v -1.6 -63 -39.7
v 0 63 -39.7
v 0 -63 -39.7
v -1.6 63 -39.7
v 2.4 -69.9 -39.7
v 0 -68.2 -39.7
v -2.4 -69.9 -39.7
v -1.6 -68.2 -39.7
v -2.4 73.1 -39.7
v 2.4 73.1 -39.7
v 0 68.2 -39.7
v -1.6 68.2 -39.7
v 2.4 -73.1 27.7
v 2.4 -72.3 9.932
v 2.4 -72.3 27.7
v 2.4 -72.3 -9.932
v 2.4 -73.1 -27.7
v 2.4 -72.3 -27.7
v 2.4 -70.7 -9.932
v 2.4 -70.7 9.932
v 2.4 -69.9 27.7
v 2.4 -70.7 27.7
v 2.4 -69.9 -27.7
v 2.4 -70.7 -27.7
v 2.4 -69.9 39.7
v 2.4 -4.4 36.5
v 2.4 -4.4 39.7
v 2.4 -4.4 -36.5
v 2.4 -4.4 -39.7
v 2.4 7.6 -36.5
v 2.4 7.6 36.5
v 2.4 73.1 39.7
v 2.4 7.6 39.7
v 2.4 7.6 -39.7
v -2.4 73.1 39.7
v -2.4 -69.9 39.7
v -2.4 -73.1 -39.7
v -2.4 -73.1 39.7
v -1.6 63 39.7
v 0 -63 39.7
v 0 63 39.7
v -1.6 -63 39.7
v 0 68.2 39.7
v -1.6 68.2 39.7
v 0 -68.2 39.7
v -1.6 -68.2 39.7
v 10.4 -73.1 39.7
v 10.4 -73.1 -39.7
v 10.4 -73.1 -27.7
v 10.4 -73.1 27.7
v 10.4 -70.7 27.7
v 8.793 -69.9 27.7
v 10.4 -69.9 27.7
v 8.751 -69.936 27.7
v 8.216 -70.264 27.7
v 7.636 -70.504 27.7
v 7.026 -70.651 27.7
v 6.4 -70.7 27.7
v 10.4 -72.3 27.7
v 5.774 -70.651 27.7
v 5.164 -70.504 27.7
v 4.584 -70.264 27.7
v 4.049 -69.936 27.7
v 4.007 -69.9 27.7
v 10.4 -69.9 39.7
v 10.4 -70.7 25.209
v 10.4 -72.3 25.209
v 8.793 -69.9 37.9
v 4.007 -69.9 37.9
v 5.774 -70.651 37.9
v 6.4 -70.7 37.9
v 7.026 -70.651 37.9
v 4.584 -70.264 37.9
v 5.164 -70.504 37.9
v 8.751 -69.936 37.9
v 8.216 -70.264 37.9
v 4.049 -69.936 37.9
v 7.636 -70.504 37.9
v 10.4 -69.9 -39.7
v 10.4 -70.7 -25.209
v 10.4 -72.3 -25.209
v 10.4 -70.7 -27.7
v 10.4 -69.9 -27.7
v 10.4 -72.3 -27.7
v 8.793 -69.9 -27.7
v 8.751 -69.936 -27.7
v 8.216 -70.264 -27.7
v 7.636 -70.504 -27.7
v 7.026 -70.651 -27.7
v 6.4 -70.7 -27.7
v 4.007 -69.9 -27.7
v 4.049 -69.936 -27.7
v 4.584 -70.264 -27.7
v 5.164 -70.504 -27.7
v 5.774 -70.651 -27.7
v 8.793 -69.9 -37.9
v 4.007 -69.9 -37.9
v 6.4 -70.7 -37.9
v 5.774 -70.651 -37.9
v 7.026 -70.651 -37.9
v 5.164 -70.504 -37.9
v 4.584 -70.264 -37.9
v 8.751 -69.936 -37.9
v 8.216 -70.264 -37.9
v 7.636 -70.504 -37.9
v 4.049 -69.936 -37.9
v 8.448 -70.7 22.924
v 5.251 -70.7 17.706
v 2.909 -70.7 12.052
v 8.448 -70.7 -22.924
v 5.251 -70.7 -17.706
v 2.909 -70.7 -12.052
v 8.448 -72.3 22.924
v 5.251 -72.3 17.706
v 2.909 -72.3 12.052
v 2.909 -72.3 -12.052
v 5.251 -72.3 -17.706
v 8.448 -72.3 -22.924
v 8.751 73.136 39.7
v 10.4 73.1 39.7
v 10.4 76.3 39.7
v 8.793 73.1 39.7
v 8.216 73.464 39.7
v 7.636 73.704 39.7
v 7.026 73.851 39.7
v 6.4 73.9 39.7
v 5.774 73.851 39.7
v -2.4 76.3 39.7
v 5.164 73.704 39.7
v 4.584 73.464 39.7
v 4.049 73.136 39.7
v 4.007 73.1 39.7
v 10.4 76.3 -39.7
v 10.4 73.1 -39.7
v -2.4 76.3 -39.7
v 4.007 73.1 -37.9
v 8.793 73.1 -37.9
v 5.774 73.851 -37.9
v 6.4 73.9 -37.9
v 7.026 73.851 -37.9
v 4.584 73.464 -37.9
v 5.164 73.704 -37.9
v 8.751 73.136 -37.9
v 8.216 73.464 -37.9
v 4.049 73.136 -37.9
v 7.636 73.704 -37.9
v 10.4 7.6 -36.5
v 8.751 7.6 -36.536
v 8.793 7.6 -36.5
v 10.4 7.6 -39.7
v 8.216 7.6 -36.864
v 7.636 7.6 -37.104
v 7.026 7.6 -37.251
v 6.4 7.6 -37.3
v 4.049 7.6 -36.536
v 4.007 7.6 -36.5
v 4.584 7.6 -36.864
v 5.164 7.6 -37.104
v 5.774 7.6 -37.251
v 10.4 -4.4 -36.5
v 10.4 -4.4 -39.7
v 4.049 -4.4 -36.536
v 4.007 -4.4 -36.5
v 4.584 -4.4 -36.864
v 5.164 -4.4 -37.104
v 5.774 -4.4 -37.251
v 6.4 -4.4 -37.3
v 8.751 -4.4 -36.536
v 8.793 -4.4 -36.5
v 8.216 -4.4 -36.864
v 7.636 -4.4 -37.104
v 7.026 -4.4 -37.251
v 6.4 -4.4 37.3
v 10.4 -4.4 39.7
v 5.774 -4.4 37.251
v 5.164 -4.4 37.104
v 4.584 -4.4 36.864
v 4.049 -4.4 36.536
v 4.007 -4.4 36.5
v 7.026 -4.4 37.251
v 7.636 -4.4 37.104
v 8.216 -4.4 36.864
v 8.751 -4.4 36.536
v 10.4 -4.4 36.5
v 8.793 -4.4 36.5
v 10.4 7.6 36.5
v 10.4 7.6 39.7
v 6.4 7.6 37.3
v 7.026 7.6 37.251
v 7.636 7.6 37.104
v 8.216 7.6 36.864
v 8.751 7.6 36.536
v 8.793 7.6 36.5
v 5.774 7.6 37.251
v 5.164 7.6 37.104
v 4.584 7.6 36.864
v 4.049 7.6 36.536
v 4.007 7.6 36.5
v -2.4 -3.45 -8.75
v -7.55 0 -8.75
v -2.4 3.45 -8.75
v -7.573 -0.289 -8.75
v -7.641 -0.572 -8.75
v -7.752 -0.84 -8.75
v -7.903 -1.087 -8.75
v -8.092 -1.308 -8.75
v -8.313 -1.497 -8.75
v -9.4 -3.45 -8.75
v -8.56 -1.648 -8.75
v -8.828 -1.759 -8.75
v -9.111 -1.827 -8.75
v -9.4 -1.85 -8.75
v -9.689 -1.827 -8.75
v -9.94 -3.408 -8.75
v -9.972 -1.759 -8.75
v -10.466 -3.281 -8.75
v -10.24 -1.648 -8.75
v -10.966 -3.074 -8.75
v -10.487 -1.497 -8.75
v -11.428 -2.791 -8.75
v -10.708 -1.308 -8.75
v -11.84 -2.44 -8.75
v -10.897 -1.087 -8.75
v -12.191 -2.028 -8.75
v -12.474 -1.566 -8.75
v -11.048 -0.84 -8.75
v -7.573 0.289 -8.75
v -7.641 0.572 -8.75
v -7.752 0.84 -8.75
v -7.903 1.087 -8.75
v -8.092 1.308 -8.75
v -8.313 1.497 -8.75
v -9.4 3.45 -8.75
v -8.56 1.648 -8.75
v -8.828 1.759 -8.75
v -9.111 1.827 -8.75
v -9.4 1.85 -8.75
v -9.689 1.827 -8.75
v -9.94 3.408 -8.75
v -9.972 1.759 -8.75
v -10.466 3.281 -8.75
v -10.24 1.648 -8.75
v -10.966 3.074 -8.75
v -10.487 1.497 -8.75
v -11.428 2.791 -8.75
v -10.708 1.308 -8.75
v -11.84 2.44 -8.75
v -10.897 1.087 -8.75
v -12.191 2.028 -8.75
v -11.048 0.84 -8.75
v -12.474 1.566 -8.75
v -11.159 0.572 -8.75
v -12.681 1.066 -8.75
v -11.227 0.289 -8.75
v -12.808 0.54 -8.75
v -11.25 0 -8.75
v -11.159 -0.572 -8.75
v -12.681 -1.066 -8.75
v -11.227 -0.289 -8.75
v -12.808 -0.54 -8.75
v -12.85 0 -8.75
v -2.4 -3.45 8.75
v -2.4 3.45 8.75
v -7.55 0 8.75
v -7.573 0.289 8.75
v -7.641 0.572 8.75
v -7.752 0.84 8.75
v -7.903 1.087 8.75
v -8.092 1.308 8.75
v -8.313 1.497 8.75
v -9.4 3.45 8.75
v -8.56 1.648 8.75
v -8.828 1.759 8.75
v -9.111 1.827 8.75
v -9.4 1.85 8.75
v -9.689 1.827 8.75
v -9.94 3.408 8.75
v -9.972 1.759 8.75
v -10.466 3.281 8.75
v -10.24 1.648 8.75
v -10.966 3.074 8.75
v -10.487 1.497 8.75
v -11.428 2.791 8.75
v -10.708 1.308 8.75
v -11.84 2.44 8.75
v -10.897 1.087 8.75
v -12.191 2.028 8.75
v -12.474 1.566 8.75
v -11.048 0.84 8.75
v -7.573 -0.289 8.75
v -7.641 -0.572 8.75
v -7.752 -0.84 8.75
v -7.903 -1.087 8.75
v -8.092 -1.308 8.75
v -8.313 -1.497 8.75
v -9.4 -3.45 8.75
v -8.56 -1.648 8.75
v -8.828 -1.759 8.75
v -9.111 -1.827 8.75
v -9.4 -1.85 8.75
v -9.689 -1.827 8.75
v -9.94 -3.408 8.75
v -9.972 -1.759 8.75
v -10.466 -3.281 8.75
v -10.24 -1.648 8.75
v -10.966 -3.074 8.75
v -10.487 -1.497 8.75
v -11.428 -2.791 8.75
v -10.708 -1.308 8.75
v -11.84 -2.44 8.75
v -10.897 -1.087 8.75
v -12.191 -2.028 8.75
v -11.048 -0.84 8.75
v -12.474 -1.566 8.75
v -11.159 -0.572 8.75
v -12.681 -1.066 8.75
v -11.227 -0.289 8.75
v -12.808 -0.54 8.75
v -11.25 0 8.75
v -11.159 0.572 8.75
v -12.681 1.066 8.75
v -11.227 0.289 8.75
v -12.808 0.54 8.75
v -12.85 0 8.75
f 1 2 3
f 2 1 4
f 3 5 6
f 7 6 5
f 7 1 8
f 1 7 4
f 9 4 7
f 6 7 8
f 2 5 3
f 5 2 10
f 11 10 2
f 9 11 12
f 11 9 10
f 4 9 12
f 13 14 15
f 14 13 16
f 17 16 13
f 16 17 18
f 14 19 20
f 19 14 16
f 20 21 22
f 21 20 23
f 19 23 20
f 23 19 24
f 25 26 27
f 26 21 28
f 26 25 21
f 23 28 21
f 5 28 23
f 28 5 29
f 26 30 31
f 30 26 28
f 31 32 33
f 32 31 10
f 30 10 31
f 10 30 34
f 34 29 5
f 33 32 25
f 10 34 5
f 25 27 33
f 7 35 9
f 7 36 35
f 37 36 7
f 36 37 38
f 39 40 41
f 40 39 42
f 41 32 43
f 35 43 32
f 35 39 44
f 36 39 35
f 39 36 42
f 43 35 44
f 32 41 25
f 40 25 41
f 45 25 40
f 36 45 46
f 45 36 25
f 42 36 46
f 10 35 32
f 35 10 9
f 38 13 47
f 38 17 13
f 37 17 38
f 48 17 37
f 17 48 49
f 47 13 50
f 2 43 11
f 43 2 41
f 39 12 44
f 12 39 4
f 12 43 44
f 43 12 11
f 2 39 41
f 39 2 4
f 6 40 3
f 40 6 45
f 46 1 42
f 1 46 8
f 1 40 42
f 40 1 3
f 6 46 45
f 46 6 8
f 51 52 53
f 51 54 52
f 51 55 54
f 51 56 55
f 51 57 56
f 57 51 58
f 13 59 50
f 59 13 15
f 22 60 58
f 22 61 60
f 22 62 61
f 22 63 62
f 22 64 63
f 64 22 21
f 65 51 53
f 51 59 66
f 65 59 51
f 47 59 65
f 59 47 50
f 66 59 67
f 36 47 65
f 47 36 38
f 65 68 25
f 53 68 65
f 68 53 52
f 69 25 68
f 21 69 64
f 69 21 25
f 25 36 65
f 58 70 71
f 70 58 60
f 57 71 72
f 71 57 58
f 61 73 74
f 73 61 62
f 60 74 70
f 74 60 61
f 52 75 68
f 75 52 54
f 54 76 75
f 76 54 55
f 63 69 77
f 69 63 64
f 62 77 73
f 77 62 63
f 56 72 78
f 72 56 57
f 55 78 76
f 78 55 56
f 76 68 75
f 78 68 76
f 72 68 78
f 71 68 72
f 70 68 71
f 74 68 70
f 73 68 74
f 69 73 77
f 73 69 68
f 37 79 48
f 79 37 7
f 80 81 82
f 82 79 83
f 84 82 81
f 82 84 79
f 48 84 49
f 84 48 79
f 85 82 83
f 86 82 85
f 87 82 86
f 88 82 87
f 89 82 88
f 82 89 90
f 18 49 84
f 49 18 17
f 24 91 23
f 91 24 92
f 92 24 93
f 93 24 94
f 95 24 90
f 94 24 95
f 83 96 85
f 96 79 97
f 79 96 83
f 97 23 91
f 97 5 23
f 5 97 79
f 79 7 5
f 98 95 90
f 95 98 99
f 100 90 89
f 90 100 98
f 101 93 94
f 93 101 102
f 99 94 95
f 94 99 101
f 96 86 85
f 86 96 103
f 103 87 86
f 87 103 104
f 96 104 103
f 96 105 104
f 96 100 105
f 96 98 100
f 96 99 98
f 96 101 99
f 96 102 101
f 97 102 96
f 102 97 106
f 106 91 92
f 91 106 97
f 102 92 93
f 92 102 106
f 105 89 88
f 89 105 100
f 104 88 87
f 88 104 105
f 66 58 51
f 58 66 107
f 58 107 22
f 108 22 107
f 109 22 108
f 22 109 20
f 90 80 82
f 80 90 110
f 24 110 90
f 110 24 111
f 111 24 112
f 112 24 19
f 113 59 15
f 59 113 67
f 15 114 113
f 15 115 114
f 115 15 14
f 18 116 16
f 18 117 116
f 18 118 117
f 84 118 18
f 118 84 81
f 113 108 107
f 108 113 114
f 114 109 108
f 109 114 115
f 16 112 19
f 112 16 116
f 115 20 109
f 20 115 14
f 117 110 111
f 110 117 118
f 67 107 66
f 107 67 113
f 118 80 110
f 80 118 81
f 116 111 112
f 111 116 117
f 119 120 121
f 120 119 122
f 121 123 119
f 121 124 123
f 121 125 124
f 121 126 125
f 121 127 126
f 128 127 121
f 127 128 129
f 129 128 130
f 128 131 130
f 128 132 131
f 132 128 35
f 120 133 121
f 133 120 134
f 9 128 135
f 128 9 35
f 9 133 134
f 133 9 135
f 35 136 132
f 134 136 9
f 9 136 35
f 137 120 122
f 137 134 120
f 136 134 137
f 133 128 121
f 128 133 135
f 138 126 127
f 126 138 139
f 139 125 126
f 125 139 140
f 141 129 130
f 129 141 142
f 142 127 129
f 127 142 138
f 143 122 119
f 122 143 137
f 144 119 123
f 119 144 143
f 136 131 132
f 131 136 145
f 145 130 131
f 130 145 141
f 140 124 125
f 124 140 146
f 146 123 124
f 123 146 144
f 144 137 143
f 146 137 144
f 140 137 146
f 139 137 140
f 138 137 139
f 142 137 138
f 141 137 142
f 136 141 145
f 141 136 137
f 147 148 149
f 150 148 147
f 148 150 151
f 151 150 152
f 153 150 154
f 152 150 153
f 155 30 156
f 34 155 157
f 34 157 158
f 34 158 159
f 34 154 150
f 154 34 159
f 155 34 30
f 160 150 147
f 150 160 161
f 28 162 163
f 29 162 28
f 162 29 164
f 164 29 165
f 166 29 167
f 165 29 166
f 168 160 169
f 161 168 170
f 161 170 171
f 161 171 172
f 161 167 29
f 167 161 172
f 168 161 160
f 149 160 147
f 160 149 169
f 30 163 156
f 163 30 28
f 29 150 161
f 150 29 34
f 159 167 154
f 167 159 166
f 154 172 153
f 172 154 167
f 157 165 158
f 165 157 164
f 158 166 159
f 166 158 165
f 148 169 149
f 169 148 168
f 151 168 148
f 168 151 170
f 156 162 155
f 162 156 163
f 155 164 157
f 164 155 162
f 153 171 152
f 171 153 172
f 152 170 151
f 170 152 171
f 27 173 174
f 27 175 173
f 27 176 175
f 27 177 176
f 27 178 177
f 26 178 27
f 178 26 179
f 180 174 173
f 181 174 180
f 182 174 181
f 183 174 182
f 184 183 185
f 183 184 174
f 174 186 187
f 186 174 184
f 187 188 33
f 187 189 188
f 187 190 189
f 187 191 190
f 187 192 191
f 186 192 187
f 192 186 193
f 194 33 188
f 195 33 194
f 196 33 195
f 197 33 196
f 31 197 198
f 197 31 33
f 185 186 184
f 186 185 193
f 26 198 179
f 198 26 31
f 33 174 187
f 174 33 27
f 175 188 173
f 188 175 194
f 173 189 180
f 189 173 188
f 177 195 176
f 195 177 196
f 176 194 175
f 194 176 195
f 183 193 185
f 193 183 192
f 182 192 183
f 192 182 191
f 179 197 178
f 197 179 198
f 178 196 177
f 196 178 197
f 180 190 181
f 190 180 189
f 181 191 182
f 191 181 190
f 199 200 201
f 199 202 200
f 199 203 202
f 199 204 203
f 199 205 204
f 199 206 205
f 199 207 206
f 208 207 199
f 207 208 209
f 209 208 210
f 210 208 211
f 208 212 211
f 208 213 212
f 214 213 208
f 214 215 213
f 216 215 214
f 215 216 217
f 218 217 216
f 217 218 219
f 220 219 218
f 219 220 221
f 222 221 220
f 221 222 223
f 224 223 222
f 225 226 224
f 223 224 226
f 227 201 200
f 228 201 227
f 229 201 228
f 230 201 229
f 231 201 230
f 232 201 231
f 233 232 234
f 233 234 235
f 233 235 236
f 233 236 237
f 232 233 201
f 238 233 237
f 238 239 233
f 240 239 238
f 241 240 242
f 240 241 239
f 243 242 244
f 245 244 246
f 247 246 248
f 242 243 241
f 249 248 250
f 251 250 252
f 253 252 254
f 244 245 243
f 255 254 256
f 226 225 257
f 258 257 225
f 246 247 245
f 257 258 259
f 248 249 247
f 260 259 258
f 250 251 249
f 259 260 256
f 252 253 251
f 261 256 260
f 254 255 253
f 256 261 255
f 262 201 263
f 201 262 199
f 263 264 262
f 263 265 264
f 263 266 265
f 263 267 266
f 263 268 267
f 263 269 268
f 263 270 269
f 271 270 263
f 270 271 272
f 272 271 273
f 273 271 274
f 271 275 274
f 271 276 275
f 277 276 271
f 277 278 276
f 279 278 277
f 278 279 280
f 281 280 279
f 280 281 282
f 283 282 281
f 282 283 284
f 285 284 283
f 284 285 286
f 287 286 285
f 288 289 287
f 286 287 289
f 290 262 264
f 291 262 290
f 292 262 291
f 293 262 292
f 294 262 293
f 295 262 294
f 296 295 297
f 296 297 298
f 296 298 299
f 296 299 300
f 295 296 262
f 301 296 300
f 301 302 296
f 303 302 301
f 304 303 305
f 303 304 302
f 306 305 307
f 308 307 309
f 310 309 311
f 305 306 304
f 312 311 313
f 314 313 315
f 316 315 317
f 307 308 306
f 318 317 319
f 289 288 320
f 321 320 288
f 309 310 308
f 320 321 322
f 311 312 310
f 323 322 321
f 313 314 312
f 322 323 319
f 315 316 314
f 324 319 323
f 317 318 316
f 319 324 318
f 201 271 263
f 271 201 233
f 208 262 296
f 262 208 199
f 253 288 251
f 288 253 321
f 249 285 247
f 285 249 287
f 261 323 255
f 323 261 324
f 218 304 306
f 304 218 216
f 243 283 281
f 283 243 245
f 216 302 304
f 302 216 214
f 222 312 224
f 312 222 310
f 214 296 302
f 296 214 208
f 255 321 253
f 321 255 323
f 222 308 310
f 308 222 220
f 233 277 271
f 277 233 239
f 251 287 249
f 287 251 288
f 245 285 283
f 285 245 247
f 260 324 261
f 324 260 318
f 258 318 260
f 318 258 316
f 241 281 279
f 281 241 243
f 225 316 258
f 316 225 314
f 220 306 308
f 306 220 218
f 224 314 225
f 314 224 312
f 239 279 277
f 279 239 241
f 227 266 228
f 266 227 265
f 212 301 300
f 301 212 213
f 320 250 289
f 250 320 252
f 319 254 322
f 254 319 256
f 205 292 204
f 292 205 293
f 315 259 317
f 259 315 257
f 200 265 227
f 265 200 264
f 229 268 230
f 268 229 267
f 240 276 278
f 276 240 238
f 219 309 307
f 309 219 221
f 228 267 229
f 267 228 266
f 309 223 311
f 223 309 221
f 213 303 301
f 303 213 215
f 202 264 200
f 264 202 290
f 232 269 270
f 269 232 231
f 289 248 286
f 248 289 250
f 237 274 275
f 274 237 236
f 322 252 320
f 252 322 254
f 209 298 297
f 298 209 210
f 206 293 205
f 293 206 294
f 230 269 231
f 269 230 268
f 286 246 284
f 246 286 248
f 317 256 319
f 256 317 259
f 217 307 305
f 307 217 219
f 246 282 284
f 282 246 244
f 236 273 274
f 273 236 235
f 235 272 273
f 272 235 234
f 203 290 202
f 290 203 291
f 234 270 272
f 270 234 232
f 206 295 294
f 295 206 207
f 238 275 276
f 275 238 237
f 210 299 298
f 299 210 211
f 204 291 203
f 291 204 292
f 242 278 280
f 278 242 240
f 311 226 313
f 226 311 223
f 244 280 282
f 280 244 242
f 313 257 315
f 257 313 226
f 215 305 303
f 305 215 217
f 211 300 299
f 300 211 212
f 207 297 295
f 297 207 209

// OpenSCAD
$fn=40;
pared=1.6;
radio_tornillo=3.7/2;
ancho=17.5;
largo=143+pared*2;
alto=14/2;
ancho_movil=70.5+pared*4+2.5;
ancho_borde=15/2;
ancho_base_movil_izquierda=12;
ancho_base_movil_derecha=12;
grosor_movil=8;
ancho_brida=5.2;
// grosor_brida=ancho_brida/2;
grosor_brida=1.6;
base_grosor=pared+grosor_brida+pared;

module base_movil(ancho_base_movil=12, radio_base=12,offset=0){
	difference(){
		cube([ancho_base_movil,pared*2,base_grosor+grosor_movil], center=true);
		translate([offset,radio_base+pared/2,(base_grosor)/2])
			rotate([0,90,0])
				cylinder(h=ancho_base_movil,r=radio_base, center=true);
	}
}
rotate([0,90,0])
{
	difference(){
		cube([ancho_movil,largo,base_grosor],center=true);
		translate([0,largo/2-ancho_borde,-pared/2])
				cube([ancho_movil,ancho_brida,grosor_brida], center=true);
		translate([0,-largo/2+ancho_borde,-pared/2])
				cube([ancho_movil,ancho_brida,grosor_brida], center=true);
	}
	translate([-ancho_movil/2+ancho_base_movil_izquierda/2,-largo/2+pared,grosor_movil/2])
			// cube([ancho_base_movil_izquierda,pared*2,base_grosor+grosor_movil], center=true);
			base_movil(ancho_base_movil_izquierda,4,1.8);
	translate([ancho_movil/2-ancho_base_movil_derecha/2,-largo/2+pared,grosor_movil/2])
			// cube([ancho_base_movil_derecha,pared*2,base_grosor+grosor_movil], center=true);
			base_movil(ancho_base_movil_derecha,4,-1.8);
	// translate([0,-largo/2+pared,grosor_movil/2])
		// difference(){
			// cube([ancho_movil,pared,base_grosor+grosor_movil], center=true);
			// translate([0,ancho_movil/2+pared/2,(base_grosor)/2])
				// rotate([0,0,0])
					// cylinder(h=ancho_movil,r=11, center=true);
		// }
	translate([0,-largo/2+pared,grosor_movil/2])
		rotate([90,0,90])
			difference(){
				cube([pared,base_grosor+grosor_movil,ancho_movil], center=true);
				translate([0,36,0])
					rotate([0,90,0])
						cylinder(h=pared*2,r=39, center=true);
			}
			// base_movil(pared*2,4);
	translate([0,largo/2+pared,grosor_movil/2])
			// cube([ancho_movil,pared*2,base_grosor+grosor_movil], center=true);
		rotate([180,180,0])
			base_movil(ancho_movil,4,1.8);
	translate([ancho_movil/2-pared,pared,grosor_movil/2])
		rotate([180,180,-90])
			base_movil(ancho_base_movil_derecha,4);
	translate([-ancho_movil/2+pared,pared,grosor_movil/2])
		rotate([180,180,90])
			base_movil(ancho_base_movil_derecha,4);
	translate([0,0,-alto-(base_grosor)/2])
		difference(){
			union()
			{
				translate([0,0,alto/2])
					cube([ancho,(radio_tornillo+pared)*2,alto],center=true);
				rotate([0,90,0])
					cylinder(h=ancho,r=radio_tornillo+pared, center=true);
			}
			rotate([0,90,0])
				cylinder(h=ancho,r=radio_tornillo, center=true);
		}
}
